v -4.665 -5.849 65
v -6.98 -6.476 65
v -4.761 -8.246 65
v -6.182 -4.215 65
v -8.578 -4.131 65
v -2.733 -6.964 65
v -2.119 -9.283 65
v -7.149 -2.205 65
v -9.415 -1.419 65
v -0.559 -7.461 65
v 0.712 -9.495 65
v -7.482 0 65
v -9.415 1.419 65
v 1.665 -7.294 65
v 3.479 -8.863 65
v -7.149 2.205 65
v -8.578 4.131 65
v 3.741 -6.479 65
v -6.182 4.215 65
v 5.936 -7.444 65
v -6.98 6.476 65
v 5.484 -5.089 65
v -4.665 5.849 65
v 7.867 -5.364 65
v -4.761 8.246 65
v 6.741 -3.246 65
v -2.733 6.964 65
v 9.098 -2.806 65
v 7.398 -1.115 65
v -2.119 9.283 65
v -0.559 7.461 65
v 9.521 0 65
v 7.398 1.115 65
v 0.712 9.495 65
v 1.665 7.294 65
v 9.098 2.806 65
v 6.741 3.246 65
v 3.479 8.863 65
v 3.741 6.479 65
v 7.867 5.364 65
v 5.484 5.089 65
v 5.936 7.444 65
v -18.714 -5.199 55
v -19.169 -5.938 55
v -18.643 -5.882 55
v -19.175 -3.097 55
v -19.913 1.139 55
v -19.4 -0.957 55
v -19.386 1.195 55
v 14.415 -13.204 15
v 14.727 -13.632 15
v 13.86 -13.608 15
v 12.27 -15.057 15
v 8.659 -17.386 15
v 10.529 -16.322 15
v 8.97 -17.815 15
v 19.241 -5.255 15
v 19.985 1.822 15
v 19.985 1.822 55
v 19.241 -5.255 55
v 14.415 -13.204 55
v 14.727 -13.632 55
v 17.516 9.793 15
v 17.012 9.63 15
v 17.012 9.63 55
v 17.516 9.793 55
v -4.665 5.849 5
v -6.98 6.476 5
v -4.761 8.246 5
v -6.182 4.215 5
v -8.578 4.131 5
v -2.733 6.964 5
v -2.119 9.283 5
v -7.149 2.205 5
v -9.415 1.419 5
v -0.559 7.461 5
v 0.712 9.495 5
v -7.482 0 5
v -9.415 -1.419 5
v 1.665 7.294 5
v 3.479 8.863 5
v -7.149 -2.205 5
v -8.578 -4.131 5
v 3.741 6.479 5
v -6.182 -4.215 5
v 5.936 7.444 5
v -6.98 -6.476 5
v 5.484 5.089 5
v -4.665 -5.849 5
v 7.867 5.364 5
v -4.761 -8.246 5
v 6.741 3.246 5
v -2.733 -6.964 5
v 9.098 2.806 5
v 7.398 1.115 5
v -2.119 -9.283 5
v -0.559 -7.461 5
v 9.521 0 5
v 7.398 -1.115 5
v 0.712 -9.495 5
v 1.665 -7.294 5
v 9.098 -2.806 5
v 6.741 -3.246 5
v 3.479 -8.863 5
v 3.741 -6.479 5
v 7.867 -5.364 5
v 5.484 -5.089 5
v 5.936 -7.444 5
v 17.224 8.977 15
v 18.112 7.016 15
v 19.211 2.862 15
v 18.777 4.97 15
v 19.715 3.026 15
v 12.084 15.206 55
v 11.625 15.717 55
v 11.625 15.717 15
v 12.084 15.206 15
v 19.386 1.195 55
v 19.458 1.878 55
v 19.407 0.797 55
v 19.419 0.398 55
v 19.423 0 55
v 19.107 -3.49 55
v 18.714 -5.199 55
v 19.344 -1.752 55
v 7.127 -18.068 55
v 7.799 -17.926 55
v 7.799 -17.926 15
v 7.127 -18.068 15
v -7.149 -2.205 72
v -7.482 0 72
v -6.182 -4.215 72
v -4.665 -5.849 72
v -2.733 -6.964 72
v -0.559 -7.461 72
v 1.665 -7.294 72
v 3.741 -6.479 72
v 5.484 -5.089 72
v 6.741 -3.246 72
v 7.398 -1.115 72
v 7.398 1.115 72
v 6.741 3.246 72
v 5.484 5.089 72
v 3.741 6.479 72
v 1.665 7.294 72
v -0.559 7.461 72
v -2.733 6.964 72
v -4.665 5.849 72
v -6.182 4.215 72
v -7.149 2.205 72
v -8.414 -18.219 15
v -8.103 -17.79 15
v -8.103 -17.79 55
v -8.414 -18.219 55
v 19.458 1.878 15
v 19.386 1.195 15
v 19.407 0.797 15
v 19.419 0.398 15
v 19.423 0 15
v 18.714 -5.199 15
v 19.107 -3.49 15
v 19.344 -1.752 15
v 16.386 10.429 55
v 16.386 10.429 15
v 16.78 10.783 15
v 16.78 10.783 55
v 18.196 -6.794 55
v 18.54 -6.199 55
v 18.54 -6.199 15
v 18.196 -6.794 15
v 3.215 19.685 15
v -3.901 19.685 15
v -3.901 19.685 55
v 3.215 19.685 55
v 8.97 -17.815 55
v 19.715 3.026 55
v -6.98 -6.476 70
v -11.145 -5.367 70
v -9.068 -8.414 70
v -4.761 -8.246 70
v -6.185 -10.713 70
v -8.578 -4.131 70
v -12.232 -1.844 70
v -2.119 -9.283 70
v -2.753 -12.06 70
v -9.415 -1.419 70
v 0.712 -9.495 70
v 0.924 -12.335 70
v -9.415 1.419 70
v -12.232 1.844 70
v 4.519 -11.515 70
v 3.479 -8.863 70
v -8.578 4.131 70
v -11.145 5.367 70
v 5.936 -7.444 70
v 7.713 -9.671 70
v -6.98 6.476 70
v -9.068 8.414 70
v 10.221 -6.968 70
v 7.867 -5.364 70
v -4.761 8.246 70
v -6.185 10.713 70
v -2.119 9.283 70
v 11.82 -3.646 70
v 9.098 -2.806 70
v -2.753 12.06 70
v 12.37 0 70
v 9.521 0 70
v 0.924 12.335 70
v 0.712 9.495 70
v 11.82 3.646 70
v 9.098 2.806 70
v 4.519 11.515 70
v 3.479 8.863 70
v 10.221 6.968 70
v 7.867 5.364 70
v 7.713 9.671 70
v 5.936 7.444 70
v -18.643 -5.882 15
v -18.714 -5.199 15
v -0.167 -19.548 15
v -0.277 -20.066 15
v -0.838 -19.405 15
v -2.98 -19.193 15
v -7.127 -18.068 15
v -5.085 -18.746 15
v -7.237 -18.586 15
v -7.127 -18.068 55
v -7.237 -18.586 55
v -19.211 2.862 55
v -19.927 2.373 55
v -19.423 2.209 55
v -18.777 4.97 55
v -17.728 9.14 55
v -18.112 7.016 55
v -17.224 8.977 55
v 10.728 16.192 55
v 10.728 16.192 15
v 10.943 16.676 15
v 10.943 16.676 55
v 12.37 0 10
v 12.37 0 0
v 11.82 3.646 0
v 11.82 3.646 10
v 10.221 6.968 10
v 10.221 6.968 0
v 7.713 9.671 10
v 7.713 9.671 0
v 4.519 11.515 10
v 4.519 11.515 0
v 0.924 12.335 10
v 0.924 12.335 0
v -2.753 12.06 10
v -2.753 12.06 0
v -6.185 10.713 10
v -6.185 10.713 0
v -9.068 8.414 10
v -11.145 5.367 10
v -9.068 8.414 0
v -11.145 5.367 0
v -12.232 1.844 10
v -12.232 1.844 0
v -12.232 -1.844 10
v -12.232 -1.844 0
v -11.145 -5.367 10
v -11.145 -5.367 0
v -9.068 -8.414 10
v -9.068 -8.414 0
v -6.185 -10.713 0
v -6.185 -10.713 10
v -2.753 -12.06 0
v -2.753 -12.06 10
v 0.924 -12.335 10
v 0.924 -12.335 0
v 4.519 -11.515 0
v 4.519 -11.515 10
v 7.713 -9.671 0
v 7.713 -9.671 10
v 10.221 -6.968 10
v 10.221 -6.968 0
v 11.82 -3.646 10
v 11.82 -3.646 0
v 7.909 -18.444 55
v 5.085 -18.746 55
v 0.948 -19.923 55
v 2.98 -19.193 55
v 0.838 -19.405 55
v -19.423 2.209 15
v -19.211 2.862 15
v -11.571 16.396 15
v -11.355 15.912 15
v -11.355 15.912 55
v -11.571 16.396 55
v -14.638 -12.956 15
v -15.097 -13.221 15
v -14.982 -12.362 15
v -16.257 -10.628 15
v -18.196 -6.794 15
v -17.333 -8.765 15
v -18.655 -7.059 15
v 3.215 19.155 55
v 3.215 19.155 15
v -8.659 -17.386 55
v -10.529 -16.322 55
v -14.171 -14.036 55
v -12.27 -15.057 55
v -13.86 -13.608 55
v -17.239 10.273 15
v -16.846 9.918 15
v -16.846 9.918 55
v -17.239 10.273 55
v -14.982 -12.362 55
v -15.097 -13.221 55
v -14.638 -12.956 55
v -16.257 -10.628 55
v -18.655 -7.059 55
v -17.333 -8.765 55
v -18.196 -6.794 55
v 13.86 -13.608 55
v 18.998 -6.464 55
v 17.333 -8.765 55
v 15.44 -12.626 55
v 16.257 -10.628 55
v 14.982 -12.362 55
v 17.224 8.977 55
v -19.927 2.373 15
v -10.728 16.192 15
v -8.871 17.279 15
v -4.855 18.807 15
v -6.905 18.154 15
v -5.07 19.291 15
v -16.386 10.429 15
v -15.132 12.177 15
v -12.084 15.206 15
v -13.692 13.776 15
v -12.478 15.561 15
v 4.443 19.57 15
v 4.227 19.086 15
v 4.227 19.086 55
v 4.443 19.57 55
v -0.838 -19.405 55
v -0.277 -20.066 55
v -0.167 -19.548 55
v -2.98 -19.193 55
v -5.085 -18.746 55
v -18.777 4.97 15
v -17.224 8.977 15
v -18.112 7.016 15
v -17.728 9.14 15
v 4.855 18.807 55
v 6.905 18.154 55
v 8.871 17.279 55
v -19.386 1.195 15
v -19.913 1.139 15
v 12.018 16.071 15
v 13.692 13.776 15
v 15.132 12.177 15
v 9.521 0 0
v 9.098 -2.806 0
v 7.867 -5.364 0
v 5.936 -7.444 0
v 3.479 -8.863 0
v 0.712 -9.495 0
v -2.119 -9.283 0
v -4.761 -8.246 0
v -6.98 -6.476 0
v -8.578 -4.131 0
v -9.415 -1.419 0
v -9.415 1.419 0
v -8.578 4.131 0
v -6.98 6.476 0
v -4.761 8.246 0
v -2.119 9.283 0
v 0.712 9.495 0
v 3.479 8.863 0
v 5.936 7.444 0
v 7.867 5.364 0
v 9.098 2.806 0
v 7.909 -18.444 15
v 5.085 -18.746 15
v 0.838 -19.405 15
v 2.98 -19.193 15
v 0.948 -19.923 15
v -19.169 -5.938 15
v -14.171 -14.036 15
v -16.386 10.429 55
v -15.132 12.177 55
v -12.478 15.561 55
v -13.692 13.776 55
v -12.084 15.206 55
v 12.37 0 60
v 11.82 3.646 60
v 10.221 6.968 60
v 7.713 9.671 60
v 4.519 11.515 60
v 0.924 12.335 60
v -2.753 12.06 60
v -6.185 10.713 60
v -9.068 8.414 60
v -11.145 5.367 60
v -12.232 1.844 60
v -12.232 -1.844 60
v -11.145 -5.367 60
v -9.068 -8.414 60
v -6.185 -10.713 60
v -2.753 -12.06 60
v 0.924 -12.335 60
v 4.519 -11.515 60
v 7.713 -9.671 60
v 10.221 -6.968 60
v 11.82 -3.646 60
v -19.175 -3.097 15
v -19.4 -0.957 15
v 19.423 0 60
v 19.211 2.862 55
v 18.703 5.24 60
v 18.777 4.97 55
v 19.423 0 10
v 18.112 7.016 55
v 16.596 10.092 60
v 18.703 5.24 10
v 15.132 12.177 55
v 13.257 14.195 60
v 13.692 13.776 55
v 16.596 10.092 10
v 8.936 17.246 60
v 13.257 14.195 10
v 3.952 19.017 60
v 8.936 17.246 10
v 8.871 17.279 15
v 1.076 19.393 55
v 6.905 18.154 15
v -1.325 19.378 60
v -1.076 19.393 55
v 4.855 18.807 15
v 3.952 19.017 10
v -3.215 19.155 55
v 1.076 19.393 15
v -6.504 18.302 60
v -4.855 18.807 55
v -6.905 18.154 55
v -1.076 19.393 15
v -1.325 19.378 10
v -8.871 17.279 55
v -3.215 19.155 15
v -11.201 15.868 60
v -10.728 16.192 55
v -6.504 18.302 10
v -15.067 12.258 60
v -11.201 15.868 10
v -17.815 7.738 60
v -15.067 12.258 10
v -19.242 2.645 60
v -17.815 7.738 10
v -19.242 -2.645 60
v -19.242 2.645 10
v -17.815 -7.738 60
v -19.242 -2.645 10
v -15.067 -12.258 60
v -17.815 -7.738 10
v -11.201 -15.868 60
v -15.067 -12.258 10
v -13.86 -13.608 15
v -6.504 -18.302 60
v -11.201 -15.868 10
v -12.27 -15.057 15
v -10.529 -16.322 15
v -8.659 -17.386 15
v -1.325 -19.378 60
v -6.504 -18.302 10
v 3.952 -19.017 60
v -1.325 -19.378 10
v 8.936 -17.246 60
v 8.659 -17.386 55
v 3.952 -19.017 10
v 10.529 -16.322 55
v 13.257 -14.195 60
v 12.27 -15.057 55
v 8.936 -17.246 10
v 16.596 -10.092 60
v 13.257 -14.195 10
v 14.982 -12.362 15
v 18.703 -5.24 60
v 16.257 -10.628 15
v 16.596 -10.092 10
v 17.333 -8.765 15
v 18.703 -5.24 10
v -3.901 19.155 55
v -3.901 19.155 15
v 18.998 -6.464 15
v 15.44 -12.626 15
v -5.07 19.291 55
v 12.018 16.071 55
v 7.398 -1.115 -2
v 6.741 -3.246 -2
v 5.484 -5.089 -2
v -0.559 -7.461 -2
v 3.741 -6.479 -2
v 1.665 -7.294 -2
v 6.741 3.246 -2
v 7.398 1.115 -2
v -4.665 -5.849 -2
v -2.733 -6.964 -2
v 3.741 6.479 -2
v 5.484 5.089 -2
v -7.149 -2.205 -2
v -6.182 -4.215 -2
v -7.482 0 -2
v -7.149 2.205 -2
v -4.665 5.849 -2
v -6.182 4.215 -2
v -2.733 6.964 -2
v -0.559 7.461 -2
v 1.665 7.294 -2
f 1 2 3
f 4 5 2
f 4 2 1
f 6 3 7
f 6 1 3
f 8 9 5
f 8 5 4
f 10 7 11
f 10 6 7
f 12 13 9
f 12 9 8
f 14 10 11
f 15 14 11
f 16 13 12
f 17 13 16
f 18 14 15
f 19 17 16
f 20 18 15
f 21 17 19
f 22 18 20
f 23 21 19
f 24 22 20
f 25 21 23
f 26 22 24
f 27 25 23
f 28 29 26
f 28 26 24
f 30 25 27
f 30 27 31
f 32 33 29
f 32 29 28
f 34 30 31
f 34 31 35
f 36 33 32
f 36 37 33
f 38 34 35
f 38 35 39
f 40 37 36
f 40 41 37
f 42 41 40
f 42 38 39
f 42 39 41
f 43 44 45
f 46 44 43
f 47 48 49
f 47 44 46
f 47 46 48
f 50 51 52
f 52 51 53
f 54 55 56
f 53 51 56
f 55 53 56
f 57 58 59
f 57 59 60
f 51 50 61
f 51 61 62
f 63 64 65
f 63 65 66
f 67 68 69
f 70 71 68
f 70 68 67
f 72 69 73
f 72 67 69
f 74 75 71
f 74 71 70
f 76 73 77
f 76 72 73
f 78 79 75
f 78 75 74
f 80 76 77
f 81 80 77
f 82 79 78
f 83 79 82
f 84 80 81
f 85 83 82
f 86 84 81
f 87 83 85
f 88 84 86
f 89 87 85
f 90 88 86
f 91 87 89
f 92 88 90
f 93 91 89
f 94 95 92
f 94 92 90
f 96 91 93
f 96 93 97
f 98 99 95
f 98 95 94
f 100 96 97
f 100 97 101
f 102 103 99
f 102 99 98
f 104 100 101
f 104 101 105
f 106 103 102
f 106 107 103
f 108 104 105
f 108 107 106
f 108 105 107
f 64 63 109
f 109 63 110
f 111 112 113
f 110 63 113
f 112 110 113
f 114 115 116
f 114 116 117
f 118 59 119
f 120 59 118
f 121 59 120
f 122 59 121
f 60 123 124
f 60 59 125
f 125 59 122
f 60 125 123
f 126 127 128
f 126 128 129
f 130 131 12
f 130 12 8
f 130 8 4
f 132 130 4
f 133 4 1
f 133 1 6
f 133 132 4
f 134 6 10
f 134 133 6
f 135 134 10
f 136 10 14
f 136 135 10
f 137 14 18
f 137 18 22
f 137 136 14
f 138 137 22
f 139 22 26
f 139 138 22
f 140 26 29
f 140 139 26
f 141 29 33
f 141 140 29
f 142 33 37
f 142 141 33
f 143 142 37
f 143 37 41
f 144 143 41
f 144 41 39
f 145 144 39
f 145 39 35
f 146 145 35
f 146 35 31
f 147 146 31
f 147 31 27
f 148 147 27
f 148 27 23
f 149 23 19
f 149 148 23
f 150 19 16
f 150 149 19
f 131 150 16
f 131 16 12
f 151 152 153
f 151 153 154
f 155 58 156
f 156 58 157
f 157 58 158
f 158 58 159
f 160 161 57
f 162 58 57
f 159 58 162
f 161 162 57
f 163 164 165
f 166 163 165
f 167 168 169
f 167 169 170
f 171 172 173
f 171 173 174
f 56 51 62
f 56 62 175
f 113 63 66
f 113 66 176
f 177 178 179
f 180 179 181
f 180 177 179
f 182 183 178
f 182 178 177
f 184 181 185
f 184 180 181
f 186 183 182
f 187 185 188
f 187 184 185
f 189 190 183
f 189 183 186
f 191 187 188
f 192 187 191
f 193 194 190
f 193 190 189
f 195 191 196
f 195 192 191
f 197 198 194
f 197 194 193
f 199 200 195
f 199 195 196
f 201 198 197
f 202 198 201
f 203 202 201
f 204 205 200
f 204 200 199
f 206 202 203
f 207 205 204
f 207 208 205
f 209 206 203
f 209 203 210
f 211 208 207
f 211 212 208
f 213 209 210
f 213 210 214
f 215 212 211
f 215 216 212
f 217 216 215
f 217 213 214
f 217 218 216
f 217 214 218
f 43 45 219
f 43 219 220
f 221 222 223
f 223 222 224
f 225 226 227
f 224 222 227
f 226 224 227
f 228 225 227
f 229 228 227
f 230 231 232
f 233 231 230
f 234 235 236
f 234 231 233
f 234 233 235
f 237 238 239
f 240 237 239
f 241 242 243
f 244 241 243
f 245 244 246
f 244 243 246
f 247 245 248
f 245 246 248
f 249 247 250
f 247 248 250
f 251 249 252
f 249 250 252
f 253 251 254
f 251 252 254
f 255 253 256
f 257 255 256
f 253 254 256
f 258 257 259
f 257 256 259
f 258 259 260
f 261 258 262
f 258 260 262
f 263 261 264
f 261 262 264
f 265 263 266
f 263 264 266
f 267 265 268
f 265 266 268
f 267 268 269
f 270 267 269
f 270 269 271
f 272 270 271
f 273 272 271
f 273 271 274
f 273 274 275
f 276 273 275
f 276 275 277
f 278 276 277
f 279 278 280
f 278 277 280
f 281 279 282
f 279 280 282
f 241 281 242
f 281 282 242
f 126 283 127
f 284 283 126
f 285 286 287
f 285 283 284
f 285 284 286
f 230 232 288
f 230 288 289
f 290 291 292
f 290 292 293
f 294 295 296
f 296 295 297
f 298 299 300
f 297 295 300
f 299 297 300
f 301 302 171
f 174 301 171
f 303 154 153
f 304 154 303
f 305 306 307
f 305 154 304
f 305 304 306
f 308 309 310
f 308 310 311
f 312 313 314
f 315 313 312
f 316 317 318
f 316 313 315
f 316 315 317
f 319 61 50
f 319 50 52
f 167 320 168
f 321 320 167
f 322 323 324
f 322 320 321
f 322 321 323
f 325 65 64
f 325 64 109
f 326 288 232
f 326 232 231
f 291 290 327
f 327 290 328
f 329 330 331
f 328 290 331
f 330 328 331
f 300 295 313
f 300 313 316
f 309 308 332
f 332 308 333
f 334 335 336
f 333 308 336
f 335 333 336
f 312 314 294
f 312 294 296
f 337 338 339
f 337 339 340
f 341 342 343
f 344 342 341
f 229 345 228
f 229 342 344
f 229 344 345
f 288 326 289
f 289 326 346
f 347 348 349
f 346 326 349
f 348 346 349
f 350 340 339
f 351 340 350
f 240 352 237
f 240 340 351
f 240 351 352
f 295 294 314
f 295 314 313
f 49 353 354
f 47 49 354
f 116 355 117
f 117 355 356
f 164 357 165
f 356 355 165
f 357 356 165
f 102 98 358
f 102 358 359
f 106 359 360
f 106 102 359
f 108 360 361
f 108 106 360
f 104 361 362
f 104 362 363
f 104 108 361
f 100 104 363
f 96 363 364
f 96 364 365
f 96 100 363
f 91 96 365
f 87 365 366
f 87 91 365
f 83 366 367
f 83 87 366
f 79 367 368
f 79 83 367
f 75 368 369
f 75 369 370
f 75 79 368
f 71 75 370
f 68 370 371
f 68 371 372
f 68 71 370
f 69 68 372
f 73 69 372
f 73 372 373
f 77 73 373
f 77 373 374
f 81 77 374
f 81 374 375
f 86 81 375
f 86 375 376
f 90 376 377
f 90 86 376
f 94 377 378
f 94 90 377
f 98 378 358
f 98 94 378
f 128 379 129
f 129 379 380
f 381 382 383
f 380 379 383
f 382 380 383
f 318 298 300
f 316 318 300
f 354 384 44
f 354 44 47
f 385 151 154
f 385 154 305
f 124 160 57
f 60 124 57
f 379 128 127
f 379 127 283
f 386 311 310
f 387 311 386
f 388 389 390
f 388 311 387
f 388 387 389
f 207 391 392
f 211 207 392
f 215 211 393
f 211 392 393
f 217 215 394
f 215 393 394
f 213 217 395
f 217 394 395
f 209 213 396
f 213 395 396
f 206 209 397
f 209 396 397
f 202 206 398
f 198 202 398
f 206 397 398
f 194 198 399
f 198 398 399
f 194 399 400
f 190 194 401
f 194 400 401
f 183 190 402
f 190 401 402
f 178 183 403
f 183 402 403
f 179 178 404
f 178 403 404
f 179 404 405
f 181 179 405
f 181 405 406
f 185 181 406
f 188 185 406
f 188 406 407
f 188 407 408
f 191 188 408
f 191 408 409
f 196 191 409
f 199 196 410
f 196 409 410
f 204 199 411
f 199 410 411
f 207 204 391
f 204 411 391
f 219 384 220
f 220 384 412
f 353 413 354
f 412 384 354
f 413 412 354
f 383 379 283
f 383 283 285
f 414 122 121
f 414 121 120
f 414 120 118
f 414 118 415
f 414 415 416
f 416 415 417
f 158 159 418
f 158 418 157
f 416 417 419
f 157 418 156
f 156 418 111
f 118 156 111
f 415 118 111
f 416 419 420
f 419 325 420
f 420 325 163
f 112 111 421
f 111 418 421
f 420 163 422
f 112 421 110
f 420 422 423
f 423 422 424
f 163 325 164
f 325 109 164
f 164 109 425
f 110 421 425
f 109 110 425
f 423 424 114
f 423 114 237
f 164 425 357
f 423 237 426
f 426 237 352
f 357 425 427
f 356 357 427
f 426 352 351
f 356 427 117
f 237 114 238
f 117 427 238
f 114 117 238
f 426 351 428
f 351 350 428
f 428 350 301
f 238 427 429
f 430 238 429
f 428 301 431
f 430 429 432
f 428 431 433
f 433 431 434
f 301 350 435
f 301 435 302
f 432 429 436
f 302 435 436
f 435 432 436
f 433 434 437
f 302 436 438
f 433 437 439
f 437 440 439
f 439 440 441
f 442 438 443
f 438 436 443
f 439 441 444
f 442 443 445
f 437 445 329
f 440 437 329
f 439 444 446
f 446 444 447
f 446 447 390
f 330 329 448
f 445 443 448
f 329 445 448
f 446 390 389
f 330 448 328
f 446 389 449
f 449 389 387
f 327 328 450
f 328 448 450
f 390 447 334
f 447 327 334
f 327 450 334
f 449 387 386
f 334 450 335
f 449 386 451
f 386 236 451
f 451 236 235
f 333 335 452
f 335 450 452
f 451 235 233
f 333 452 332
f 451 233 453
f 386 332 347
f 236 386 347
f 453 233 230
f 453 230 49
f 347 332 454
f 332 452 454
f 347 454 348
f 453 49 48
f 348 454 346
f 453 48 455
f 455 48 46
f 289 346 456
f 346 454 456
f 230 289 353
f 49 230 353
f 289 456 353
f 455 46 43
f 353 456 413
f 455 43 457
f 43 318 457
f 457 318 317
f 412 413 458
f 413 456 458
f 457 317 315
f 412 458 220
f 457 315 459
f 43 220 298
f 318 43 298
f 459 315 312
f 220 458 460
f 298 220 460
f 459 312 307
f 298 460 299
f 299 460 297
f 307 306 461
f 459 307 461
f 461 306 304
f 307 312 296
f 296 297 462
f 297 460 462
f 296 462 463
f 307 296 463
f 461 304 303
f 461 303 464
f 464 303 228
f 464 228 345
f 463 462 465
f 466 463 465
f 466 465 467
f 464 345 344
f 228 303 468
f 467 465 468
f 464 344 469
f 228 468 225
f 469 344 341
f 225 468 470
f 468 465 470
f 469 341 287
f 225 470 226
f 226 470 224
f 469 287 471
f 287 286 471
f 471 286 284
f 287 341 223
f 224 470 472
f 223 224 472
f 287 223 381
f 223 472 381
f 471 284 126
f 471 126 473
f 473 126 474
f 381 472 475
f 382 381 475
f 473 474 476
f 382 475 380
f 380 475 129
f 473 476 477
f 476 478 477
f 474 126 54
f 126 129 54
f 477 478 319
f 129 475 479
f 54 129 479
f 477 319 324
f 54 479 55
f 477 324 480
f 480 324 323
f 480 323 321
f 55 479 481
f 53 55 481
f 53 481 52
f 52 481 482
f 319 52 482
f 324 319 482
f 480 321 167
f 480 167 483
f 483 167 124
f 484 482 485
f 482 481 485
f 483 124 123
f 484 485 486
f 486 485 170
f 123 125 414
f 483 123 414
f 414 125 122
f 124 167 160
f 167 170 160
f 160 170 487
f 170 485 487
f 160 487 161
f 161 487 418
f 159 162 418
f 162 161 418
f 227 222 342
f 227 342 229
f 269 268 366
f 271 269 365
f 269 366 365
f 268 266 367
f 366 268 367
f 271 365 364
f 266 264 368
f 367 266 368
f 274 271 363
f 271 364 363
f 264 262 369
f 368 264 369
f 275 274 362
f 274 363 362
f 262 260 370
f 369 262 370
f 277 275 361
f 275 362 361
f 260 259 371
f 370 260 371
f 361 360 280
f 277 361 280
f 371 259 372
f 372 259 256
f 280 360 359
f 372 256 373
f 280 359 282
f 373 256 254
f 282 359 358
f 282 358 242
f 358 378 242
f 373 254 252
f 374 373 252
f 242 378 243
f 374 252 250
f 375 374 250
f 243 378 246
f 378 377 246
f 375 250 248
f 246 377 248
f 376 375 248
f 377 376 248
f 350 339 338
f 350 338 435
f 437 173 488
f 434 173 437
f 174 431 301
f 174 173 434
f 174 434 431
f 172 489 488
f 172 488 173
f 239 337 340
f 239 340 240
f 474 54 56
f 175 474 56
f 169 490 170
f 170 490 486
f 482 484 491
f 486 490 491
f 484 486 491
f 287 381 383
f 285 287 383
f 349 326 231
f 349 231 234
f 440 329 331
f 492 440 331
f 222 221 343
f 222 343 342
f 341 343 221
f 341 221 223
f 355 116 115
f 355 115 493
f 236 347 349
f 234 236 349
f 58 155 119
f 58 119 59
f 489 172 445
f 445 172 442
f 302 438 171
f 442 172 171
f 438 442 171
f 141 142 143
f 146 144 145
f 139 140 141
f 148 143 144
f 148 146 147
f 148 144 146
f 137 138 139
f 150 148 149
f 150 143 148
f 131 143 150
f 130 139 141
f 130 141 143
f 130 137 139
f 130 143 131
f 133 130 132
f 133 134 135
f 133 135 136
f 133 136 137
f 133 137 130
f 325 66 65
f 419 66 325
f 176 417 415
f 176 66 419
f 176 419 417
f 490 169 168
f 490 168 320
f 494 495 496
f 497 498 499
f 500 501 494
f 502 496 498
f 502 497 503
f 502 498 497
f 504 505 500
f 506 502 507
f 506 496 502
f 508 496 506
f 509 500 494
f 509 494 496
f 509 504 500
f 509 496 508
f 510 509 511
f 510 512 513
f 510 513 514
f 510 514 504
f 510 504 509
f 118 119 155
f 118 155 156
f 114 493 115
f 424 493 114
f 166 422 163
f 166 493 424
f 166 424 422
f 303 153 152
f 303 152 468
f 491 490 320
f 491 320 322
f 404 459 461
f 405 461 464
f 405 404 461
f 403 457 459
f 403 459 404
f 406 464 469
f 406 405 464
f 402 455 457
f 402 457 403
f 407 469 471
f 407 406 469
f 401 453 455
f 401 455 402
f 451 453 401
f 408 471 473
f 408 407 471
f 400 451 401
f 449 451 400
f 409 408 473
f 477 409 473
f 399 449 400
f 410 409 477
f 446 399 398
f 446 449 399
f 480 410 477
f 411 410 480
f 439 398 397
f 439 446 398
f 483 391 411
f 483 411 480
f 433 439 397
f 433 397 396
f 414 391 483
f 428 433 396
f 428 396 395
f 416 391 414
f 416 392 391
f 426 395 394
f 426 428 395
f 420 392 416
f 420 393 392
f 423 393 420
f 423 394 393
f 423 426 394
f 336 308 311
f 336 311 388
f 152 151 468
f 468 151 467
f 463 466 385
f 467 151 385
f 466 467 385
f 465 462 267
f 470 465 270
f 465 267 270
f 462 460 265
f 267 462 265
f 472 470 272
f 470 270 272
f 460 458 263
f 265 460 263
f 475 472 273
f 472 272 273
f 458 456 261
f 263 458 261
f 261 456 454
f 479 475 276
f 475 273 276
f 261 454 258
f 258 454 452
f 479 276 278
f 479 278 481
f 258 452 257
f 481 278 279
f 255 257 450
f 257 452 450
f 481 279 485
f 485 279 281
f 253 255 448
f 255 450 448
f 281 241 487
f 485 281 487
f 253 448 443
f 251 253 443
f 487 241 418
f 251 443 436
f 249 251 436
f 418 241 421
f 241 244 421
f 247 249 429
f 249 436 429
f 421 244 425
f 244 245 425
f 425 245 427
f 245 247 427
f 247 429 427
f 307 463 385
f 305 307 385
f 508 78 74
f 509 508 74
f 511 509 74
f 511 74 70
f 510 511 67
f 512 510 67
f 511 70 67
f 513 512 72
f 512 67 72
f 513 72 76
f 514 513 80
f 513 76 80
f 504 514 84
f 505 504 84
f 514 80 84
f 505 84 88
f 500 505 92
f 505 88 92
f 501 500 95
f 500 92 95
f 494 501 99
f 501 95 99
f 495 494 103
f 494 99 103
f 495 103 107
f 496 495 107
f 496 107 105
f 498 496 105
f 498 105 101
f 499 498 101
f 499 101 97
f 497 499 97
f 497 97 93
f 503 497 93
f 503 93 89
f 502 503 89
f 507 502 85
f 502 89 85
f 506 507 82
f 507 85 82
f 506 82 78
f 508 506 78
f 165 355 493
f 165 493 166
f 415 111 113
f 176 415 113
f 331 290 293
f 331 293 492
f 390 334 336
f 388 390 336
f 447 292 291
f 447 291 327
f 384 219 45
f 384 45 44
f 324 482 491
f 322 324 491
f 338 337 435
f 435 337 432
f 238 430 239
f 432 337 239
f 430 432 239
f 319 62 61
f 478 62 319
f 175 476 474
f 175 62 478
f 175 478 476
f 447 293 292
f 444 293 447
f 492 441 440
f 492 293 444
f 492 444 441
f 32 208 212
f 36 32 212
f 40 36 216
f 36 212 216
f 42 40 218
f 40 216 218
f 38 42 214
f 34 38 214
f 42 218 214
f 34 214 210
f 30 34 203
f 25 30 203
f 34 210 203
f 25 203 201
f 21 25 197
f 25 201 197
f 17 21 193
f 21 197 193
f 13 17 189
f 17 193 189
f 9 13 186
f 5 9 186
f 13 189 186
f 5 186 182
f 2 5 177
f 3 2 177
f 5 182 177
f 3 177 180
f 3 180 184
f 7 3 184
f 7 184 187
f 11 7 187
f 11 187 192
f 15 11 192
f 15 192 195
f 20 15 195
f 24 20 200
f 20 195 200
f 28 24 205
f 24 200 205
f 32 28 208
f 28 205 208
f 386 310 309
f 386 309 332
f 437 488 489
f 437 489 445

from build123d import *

# Parameters (mm, degrees)
SKETCH1_R           = 12.37
BOSS_EXTRUDE1_DEPTH = 10
SKETCH2_R           = 19.423188446
BOSS_EXTRUDE2_DEPTH = 50
SKETCH4_R           = 12.37
BOSS_EXTRUDE3_DEPTH = 10
BOSS_EXTRUDE4_START = -5
SKETCH5_W           = 7.115833501
SKETCH5_H           = 0.529627629
BOSS_EXTRUDE4_DEPTH = 40
CIRPATTERN1_COUNT   = 15
SKETCH6_R           = 9.521283716
CUT_EXTRUDE1_DEPTH  = 5
CUT_EXTRUDE2_START  = -5
SKETCH7_R           = 9.521283716
CUT_EXTRUDE2_DEPTH  = 5
SKETCH8_R           = 7.481646465
BOSS_EXTRUDE5_DEPTH = 7
BOSS_EXTRUDE6_START = 7
SKETCH9_R           = 7.481646465
BOSS_EXTRUDE6_DEPTH = 7


with BuildPart() as part:
    # Sketch1 → Boss-Extrude1 (new body)
    with BuildSketch(Plane.XY):
        Circle(SKETCH1_R)
    extrude(amount=BOSS_EXTRUDE1_DEPTH)

    # Sketch2 → Boss-Extrude2 (add)
    with BuildSketch(Plane.XY.offset(10)):
        Circle(SKETCH2_R)
    extrude(amount=BOSS_EXTRUDE2_DEPTH)

    # Sketch4 → Boss-Extrude3 (add)
    with BuildSketch(Plane.XY.offset(60)):
        Circle(SKETCH4_R)
    extrude(amount=BOSS_EXTRUDE3_DEPTH)

    # Sketch5 → Boss-Extrude4 (add)
    with BuildSketch(Plane.XY.offset(60).offset(BOSS_EXTRUDE4_START)):
        with Locations((-0.343381899, 19.42015289)):
            Rectangle(SKETCH5_W, SKETCH5_H)
    boss_extrude4 = extrude(amount=-BOSS_EXTRUDE4_DEPTH)

    # CirPattern1: Boss-Extrude4 ×15 about axis
    cirpattern1_axis = Axis((0, 0, 0), (0, 0, -1))
    for i in range(1, CIRPATTERN1_COUNT):
        add(boss_extrude4.rotate(cirpattern1_axis, i * 360 / CIRPATTERN1_COUNT))

    # Sketch6 → Cut-Extrude1 (cut)
    with BuildSketch(Plane.XY.offset(70)):
        Circle(SKETCH6_R)
    extrude(amount=-CUT_EXTRUDE1_DEPTH, mode=Mode.SUBTRACT)

    # Sketch7 → Cut-Extrude2 (cut)
    with BuildSketch(Plane(origin=(0, 0, 0), x_dir=(-1, 0, 0), z_dir=(0, 0, -1)).offset(CUT_EXTRUDE2_START)):
        Circle(SKETCH7_R)
    extrude(amount=CUT_EXTRUDE2_DEPTH, mode=Mode.SUBTRACT)

    # Sketch8 → Boss-Extrude5 (add)
    with BuildSketch(Plane(origin=(0, 0, 5), x_dir=(-1, 0, 0), z_dir=(0, 0, -1))):
        Circle(SKETCH8_R)
    extrude(amount=BOSS_EXTRUDE5_DEPTH)

    # Sketch9 → Boss-Extrude6 (add)
    with BuildSketch(Plane.XY.offset(65).offset(BOSS_EXTRUDE6_START)):
        Circle(SKETCH9_R)
    extrude(amount=-BOSS_EXTRUDE6_DEPTH)


solid = part.part
